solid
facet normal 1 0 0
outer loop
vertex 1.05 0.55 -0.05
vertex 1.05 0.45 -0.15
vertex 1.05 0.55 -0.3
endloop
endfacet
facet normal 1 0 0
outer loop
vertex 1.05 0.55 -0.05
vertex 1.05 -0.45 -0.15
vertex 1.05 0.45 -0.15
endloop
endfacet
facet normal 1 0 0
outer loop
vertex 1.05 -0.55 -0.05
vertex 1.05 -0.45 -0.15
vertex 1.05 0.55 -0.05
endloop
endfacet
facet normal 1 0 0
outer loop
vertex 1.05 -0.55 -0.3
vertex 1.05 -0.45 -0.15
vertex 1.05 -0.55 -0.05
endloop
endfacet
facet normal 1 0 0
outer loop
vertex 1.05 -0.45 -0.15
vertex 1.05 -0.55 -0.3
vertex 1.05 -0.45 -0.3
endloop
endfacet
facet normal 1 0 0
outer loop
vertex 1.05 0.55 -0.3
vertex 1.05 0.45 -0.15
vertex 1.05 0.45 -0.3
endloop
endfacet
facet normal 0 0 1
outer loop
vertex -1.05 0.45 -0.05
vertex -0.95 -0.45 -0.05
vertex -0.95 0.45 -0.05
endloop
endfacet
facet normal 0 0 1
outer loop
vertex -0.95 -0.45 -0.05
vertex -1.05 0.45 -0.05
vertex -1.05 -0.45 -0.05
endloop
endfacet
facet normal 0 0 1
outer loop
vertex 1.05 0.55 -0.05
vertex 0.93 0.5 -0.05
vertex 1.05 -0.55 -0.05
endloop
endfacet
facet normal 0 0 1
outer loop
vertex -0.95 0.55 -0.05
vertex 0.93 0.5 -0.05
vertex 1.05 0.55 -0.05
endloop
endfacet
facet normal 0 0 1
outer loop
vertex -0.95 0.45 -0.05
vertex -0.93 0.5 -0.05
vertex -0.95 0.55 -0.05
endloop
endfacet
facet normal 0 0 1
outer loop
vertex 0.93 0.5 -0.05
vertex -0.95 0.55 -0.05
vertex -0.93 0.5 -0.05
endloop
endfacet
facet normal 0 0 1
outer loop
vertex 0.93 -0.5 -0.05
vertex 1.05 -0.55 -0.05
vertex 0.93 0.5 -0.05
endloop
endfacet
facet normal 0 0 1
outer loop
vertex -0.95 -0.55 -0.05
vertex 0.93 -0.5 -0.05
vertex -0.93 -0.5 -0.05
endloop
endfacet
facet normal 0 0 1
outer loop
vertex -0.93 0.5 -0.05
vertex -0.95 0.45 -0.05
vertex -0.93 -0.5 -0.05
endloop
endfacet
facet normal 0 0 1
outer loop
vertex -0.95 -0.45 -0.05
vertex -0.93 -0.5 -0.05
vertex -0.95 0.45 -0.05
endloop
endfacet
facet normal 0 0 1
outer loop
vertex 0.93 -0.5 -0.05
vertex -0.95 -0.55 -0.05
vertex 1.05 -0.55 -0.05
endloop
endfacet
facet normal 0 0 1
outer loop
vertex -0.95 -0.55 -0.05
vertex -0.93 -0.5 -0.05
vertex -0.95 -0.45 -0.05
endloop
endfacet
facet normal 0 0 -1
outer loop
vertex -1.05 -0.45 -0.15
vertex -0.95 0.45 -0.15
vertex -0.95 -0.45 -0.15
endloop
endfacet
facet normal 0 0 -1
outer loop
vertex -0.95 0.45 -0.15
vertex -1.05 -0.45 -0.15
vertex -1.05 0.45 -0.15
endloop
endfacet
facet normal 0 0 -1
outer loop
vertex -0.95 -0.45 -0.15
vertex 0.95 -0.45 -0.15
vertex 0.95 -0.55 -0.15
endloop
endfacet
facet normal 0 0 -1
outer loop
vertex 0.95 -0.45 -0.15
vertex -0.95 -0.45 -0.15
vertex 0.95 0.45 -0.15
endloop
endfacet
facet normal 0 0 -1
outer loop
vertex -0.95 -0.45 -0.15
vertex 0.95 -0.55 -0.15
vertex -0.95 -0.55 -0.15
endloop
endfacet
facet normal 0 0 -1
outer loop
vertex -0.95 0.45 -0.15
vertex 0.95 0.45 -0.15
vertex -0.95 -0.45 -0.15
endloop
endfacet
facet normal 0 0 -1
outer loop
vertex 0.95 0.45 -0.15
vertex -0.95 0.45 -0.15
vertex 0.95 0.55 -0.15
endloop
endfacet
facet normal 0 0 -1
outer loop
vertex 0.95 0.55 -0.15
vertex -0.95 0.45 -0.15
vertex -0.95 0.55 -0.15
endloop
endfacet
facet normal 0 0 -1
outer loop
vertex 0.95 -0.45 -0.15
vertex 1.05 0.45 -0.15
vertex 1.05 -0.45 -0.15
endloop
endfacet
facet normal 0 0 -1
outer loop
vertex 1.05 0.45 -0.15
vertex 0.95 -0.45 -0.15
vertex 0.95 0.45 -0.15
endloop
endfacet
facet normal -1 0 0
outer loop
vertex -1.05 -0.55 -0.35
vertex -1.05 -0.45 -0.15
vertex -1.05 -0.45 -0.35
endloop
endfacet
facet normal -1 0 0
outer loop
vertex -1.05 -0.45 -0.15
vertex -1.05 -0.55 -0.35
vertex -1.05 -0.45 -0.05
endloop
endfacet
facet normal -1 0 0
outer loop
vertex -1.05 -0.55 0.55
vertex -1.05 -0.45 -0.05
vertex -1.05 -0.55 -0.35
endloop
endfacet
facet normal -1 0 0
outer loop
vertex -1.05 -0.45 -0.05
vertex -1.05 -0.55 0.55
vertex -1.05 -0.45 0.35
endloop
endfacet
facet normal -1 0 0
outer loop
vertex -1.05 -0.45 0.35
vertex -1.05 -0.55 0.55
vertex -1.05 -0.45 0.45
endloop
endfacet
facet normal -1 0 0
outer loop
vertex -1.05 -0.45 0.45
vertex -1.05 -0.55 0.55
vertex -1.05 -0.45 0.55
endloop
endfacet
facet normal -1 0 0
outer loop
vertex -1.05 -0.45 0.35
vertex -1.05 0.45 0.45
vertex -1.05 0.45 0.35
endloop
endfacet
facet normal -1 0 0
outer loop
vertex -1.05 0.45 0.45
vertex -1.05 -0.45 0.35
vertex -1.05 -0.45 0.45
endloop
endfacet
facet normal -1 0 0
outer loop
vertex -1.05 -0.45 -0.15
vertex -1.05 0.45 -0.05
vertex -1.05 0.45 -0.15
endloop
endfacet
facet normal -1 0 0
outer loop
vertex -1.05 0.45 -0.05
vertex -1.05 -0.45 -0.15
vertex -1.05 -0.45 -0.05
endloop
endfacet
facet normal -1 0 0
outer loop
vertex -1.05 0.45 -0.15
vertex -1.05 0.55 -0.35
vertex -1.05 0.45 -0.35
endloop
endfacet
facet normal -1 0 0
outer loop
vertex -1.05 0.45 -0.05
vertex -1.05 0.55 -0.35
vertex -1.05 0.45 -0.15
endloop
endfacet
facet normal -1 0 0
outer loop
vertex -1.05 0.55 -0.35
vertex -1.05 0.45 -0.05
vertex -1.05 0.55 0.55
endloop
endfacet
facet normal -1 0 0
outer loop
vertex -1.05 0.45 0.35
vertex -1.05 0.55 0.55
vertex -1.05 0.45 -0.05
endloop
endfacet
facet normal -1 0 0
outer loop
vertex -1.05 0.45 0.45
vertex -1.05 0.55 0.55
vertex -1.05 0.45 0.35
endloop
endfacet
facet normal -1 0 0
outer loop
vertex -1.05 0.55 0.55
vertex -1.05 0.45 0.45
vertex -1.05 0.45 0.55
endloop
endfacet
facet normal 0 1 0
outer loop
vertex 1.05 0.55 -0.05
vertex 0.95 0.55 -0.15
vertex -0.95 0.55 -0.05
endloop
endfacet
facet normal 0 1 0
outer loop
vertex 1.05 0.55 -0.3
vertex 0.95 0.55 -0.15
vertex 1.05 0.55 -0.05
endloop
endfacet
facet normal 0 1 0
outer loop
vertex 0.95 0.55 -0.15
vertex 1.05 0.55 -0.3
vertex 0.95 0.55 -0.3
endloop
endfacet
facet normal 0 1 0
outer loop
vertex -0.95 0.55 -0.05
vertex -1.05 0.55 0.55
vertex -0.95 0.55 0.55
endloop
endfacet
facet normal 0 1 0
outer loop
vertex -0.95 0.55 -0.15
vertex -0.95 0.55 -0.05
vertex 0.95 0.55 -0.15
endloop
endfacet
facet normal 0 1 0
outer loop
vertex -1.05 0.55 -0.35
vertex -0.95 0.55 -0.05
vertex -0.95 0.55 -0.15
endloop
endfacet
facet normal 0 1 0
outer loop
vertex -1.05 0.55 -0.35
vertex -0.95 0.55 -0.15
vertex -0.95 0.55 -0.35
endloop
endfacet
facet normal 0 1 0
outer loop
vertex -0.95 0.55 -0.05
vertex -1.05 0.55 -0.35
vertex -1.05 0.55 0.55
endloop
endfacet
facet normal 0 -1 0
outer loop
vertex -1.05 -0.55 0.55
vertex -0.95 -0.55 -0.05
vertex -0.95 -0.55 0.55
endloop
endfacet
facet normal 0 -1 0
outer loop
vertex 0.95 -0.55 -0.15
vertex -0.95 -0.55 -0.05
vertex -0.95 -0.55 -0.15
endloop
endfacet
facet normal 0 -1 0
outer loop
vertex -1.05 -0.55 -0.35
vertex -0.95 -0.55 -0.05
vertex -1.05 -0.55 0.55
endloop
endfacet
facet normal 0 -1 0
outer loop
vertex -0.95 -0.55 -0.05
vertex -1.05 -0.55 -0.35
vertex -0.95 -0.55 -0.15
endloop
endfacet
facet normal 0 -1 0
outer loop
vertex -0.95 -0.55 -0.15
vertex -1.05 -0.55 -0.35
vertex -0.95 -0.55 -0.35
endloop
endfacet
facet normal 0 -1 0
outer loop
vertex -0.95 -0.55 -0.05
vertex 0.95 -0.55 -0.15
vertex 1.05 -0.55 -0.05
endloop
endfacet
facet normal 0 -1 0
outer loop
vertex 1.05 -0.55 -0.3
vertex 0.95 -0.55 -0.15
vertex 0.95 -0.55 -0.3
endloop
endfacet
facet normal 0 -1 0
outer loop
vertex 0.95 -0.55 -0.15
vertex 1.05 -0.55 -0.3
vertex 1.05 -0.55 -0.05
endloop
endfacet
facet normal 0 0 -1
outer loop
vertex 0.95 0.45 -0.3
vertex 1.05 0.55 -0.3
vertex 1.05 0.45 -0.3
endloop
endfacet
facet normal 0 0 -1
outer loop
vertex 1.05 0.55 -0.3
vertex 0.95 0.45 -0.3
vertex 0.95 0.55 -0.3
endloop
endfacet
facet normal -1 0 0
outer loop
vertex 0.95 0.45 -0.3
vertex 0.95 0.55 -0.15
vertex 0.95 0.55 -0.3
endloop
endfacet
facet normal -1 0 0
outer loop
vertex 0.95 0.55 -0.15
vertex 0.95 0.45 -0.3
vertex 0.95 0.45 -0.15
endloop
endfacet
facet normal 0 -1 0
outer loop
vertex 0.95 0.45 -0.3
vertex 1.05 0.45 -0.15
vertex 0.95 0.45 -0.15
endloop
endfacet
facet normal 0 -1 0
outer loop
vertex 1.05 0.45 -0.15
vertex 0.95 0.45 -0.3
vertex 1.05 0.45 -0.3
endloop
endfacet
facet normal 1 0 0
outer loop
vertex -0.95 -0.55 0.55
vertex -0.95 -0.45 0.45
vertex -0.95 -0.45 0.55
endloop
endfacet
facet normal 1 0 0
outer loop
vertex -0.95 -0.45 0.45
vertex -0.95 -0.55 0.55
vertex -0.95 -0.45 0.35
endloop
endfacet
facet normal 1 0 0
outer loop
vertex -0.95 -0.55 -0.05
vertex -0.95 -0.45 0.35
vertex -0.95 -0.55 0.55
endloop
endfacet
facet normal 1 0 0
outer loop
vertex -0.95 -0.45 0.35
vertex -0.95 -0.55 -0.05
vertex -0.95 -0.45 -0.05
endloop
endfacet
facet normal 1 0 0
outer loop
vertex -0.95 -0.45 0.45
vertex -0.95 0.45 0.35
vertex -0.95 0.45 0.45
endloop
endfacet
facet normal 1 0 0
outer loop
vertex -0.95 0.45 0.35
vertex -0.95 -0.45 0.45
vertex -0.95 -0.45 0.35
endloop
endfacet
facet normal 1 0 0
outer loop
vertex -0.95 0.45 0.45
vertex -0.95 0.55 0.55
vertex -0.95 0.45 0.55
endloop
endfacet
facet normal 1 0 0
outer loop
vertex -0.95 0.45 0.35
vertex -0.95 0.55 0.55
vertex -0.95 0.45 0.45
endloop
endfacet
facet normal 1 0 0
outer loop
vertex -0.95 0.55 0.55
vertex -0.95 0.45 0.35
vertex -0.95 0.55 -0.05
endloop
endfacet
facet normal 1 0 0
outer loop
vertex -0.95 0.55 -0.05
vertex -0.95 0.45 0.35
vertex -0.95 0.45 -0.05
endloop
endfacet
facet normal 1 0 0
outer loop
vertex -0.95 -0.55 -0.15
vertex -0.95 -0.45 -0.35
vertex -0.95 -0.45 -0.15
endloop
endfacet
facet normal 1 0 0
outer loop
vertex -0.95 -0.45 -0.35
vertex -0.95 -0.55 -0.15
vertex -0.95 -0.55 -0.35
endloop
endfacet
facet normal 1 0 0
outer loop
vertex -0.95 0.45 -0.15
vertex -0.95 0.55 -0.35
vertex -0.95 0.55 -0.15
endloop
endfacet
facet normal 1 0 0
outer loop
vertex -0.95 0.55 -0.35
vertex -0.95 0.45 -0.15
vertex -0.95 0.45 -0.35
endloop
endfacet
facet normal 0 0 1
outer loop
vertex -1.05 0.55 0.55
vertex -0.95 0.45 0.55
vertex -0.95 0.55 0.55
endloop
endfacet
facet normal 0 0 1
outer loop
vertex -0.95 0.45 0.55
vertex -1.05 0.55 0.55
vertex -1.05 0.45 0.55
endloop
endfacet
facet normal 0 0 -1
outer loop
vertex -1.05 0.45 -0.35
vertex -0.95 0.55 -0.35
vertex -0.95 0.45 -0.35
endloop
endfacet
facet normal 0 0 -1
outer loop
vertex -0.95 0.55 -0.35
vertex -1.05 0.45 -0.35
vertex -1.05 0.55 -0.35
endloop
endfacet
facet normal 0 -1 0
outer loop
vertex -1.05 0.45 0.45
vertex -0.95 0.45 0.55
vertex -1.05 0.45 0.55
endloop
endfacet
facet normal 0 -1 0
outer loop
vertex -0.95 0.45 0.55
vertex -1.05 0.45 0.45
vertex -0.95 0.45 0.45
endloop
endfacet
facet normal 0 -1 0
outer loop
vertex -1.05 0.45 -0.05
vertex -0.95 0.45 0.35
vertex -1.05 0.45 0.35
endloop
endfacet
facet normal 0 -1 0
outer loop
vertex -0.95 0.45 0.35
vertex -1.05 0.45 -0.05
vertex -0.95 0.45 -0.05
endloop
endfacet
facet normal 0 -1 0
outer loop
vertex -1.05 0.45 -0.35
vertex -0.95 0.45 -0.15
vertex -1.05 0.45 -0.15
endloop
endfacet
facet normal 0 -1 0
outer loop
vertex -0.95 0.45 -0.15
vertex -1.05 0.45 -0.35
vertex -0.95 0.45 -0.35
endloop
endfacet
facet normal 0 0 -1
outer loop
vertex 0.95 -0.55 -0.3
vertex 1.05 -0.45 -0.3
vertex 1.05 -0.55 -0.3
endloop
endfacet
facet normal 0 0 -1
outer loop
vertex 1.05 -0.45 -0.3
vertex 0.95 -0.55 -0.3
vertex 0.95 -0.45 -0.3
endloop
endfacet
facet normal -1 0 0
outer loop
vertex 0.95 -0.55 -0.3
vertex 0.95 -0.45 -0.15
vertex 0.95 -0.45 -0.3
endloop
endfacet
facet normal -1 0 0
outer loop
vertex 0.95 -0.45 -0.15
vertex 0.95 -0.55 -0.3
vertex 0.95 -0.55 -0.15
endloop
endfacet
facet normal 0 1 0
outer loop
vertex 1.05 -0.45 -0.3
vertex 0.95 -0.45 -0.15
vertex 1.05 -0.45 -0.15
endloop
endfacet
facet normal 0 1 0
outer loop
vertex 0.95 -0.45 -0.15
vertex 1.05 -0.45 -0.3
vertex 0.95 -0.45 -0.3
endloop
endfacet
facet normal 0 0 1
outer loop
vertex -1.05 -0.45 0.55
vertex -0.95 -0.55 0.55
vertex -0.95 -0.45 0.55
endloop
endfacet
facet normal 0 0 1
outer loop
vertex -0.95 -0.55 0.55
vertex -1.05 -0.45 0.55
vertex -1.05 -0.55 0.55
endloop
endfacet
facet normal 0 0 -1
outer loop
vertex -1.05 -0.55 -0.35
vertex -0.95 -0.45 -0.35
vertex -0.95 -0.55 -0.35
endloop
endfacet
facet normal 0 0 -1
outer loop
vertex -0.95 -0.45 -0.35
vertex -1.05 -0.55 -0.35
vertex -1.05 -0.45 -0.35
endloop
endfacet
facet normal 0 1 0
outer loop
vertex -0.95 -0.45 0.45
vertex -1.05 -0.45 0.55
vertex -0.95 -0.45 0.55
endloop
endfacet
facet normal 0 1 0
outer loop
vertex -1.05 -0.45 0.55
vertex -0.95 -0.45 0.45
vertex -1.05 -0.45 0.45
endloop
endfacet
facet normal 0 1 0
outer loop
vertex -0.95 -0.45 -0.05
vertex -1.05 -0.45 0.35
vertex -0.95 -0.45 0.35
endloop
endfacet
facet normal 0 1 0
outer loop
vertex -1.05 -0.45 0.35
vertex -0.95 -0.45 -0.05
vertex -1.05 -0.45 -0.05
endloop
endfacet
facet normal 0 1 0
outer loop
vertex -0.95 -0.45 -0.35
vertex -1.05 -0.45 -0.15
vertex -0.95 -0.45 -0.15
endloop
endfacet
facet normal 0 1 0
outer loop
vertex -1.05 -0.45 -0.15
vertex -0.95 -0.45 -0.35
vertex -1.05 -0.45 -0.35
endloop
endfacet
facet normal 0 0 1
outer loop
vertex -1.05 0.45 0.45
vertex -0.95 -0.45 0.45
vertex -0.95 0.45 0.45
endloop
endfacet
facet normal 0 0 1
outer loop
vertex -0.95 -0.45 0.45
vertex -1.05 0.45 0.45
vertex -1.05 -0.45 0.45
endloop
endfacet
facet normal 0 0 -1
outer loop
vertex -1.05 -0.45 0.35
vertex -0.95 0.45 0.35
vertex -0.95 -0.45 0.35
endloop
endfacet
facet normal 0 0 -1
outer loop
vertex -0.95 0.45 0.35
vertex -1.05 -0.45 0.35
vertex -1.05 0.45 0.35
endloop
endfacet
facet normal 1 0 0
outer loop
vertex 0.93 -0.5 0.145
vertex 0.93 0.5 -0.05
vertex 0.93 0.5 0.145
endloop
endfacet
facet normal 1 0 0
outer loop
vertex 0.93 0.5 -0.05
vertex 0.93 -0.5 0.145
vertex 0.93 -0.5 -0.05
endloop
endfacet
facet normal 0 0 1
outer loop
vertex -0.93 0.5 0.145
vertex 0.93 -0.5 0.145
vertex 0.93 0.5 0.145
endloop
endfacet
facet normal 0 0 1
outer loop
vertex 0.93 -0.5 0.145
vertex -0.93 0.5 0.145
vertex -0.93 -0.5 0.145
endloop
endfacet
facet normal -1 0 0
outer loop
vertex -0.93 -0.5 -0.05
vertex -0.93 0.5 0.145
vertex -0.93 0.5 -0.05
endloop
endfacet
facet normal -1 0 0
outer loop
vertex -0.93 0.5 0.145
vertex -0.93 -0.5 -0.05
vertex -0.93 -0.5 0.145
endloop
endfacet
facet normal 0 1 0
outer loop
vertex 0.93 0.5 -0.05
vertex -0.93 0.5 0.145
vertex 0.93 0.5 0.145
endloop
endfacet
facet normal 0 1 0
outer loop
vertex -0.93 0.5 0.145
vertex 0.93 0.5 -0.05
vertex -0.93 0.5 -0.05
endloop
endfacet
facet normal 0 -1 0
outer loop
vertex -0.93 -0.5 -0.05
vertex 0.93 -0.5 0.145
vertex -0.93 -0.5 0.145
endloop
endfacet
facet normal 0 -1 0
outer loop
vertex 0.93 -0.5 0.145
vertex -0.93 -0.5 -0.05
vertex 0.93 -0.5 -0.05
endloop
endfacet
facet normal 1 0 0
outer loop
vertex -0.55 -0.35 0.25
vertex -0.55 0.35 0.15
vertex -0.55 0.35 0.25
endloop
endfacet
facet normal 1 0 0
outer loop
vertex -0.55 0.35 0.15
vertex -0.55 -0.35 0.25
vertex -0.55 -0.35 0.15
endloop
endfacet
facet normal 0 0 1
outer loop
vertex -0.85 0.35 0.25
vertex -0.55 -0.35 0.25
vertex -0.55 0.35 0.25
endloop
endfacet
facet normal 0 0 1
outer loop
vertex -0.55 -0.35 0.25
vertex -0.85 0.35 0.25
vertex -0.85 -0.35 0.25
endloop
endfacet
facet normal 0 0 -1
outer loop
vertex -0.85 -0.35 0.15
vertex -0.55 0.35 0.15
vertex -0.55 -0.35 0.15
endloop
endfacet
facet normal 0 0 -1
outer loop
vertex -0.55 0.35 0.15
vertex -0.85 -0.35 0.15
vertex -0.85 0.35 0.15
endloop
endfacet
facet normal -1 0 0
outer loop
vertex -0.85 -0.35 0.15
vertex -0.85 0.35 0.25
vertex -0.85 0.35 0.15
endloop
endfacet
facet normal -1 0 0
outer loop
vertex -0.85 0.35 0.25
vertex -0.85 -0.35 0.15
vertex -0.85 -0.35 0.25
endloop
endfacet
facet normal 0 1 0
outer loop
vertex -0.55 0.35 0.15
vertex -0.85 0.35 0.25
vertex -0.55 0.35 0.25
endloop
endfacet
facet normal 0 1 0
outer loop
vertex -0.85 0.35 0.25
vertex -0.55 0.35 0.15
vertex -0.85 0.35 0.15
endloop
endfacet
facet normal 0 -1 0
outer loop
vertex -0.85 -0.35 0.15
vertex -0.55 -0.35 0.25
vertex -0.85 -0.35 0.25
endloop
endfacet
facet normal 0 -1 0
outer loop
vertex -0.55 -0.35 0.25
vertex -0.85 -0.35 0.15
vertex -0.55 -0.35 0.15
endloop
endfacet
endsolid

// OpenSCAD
module Bed_01(){

color("#badbed")
cube([1.86,1,0.29], center = true);

color("#cdaa7d"){
    translate([0,0,-0.1])
    cube([2.1,1.1,0.1], center = true);


    translate([1,0.5,-0.2])
    cube([0.1,0.1,0.2], center = true);

    translate([-1,0.5,0.1])
    cube([0.1,0.1,0.9], center = true);

    translate([1,-0.5,-0.2])
    cube([0.1,0.1,0.2], center = true);

    translate([-1,-0.5,0.1])
    cube([0.1,0.1,0.9], center = true);


    translate([-1,0,0.4])
    cube([0.1,0.9,0.1], center = true);
}

color("white"){
translate([-0.7,0,0.2])
cube([0.3,0.7,0.1], center = true);
}

}

Bed_01();
